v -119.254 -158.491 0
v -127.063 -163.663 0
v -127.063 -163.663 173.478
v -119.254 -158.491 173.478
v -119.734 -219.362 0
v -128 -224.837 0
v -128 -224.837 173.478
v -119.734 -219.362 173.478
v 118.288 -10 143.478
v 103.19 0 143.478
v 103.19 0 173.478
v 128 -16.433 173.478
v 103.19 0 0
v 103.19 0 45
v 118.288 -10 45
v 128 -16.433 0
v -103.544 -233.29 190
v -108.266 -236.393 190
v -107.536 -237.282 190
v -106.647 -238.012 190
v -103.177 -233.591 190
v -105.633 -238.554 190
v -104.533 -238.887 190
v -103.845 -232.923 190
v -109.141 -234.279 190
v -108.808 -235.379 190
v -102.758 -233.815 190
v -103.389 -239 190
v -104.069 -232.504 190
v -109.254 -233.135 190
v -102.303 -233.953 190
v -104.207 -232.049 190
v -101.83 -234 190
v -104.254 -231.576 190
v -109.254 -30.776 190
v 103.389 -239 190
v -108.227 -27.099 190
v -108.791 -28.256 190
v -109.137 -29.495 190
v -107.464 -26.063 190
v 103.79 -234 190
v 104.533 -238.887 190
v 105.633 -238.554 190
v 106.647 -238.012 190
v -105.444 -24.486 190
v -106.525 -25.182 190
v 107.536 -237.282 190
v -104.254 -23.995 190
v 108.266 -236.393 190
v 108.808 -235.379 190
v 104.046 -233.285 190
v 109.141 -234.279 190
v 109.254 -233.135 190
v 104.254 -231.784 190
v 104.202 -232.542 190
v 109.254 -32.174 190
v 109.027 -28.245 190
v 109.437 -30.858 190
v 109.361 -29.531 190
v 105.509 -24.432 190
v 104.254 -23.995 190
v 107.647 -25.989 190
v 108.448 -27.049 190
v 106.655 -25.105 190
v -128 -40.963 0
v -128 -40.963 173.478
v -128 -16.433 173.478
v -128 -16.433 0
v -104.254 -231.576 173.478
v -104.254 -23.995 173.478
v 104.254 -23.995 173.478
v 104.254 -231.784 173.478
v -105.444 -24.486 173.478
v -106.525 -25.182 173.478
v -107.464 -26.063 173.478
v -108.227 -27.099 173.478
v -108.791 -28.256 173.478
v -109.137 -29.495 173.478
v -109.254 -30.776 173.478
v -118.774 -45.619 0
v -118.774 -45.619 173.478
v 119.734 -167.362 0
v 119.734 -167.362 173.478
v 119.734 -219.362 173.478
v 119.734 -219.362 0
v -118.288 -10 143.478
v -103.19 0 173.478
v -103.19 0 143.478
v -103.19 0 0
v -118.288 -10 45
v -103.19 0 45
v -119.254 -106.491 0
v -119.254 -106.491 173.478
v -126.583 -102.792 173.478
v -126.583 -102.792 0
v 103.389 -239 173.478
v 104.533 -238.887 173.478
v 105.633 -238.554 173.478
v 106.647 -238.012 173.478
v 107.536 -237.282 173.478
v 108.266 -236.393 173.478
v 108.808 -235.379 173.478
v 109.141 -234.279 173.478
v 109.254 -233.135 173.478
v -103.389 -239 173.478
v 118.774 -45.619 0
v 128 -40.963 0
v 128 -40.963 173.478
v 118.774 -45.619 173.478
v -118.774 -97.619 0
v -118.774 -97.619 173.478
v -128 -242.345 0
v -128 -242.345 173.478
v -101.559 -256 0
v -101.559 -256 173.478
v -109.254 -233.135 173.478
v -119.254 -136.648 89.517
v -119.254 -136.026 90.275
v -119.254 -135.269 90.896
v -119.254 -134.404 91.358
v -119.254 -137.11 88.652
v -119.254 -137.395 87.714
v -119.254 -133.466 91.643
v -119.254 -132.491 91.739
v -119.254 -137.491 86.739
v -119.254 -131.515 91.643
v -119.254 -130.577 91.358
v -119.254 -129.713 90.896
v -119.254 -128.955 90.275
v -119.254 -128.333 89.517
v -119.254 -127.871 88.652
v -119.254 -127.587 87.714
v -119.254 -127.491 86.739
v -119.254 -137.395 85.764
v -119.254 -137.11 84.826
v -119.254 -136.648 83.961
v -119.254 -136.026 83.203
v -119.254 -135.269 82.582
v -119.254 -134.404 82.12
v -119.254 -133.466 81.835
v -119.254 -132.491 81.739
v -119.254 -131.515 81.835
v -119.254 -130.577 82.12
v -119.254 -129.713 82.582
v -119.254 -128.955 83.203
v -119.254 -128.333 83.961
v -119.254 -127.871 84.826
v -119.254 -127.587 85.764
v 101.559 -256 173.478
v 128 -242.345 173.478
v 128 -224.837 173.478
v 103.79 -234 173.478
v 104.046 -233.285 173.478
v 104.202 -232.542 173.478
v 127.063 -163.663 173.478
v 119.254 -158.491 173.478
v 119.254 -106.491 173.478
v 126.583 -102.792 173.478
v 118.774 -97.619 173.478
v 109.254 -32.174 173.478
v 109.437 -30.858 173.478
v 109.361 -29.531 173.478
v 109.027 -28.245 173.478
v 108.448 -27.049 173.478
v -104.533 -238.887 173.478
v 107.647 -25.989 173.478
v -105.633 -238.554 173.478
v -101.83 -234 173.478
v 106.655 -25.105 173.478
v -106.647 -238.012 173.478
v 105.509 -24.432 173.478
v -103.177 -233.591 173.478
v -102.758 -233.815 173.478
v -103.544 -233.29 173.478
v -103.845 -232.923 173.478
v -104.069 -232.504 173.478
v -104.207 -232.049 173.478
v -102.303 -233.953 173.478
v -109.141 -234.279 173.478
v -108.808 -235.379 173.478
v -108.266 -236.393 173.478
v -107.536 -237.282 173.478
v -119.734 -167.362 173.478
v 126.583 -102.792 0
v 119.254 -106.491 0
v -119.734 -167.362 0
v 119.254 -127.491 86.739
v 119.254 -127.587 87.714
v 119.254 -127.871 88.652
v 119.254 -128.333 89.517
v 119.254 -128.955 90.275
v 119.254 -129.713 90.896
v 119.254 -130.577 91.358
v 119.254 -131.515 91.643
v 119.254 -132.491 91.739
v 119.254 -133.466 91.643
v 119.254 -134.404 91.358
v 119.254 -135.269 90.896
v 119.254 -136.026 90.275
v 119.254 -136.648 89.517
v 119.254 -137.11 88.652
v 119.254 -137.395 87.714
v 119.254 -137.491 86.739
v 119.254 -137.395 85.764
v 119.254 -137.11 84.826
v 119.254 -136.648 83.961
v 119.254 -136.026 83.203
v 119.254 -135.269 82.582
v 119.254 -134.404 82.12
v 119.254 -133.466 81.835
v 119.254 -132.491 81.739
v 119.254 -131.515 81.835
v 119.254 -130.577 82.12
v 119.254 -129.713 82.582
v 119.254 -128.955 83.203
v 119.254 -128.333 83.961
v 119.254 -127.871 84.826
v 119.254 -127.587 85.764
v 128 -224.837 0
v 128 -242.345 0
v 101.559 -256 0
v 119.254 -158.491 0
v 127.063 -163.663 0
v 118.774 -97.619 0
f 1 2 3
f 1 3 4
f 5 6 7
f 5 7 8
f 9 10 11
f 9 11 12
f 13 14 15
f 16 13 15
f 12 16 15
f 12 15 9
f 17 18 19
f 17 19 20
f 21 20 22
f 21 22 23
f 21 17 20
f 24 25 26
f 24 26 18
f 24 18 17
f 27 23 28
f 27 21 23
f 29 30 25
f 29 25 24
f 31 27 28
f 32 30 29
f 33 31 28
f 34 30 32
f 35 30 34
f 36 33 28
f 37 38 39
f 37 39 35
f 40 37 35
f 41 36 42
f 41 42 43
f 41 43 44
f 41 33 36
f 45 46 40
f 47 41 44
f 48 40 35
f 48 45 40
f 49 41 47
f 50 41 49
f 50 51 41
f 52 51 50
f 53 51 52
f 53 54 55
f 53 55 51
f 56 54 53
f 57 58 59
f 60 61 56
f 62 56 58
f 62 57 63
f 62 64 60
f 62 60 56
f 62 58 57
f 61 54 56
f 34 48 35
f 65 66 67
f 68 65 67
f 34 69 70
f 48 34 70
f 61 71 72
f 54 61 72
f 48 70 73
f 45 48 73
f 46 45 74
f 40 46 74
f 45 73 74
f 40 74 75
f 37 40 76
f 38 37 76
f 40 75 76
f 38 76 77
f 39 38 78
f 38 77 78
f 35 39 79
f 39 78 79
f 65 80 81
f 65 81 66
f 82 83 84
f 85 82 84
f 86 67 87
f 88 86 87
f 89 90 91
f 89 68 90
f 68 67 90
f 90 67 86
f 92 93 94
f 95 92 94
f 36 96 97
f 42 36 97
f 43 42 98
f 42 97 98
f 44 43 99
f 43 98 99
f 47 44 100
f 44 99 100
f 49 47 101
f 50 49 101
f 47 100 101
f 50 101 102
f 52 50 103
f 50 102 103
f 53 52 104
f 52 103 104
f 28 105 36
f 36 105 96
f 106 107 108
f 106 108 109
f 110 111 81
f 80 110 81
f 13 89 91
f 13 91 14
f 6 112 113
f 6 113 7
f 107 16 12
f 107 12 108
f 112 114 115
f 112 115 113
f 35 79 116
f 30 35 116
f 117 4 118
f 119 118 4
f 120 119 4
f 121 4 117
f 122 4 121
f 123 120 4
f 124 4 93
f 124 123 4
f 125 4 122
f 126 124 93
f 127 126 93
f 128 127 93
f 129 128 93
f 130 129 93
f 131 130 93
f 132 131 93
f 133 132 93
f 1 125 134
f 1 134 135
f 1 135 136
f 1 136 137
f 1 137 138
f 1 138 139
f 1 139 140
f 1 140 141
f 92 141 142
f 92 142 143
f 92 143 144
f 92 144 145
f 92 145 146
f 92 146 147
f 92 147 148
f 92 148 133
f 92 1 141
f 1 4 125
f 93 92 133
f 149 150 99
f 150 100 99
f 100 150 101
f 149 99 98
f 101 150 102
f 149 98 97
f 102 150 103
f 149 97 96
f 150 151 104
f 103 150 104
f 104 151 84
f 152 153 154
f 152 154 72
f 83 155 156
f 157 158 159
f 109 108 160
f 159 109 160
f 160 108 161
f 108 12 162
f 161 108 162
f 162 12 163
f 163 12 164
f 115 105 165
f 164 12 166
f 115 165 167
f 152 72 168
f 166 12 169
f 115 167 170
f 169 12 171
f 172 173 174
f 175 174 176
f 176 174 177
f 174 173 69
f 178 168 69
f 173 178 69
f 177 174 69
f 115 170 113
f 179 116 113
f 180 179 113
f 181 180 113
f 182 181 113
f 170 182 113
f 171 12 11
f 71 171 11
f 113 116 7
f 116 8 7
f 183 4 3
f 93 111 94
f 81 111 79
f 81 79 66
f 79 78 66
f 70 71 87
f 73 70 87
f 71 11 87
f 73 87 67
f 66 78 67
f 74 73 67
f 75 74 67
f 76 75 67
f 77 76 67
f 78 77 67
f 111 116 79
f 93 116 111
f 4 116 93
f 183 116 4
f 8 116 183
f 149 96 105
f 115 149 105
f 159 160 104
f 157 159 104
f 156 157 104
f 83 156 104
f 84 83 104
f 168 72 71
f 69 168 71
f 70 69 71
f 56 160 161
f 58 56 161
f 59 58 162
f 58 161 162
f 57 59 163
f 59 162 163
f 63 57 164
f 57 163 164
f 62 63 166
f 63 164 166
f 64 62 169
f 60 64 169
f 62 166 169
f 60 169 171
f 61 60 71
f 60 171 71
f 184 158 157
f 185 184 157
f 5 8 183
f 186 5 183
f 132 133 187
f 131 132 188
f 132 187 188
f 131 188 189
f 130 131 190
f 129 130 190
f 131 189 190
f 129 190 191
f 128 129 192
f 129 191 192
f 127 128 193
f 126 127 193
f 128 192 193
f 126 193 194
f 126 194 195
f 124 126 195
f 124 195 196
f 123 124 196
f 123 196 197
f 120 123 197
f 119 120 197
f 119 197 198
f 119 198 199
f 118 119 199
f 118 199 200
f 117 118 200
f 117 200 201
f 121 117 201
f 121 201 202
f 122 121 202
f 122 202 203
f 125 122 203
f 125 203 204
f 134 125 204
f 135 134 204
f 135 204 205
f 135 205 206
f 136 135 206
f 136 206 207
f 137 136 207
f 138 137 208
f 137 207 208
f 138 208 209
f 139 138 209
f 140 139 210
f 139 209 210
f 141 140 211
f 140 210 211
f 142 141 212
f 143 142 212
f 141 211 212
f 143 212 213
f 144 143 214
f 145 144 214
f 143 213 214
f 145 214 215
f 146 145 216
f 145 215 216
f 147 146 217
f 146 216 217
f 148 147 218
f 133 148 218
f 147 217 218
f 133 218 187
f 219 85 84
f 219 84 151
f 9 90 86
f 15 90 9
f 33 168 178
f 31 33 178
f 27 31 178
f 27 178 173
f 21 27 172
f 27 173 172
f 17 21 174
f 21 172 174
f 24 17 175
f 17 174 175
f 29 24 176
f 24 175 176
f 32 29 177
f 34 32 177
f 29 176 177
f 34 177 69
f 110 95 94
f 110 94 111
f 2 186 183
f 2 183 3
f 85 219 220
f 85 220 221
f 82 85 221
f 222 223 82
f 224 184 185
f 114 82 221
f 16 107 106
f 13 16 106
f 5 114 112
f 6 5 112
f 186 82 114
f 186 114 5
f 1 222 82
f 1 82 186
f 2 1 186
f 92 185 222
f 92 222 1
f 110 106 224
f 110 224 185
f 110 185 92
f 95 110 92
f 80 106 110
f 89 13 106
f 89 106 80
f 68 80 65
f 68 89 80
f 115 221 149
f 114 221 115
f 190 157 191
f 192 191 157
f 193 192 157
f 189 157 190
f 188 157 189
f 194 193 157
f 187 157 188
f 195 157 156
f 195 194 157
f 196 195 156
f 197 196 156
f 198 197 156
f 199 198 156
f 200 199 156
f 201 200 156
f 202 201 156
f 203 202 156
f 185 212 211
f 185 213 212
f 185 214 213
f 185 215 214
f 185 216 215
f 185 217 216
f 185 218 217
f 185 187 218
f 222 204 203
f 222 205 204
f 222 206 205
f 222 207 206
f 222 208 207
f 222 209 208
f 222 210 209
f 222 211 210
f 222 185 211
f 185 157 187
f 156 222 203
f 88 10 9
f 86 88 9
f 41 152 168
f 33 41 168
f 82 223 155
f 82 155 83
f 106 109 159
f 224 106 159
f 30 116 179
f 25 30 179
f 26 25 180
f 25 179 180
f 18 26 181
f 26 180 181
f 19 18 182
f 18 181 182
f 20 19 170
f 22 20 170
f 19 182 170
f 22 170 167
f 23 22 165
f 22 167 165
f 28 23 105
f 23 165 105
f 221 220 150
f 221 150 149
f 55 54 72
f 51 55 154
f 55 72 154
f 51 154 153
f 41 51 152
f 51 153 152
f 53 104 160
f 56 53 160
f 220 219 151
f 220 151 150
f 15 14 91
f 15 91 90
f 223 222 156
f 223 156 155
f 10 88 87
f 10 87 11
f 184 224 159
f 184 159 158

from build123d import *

# Parameters (mm, degrees)
BOSS_EXTRUDE1_DEPTH = 173.478
BOSS_EXTRUDE2_DEPTH = 16.522
SKETCH5_W           = 256
SKETCH5_H           = 98.478
CUT_EXTRUDE3_DEPTH  = 10
SKETCH7_R           = 5
CUT_EXTRUDE4_DEPTH  = 404.448315513


with BuildPart() as part:
    # Sketch1 → Boss-Extrude1 (new body)
    with BuildSketch(Plane.XY):
        Polygon((-103.1895488, 0), (103.1895488, 0), (128, -16.432610434), (128, -40.962966098), (118.774155672, -45.61934731), (118.774155672, -97.61934731), (126.583328469, -102.791566604), (119.25400561, -106.490753372), (119.25400561, -158.490753372), (127.063178407, -163.662972666), (119.733855548, -167.362159434), (119.733855548, -219.362159434), (128, -224.837043001), (128, -242.345271931), (101.558790198, -256), (-101.558790198, -256), (-128, -242.345271931), (-128, -224.837043001), (-119.733855548, -219.362159434), (-119.733855548, -167.362159434), (-127.063178407, -163.662972666), (-119.25400561, -158.490753372), (-119.25400561, -106.490753372), (-126.583328469, -102.791566604), (-118.774155672, -97.61934731), (-118.774155672, -45.61934731), (-128, -40.962966098), (-128, -16.432610434), align=None)
    extrude(amount=BOSS_EXTRUDE1_DEPTH)

    # Sketch3 → Boss-Extrude2 (add)
    with BuildSketch(Plane.XY.offset(173.478)):
        with BuildLine():
            Line((-109.25400561, -30.77642723), (-109.25400561, -233.134965715))
            ThreePointArc((-109.25400561, -233.134965715), (-107.53617684, -237.28217123), (-103.388971325, -239))
            Line((-103.388971325, -239), (103.388971325, -239))
            ThreePointArc((103.388971325, -239), (107.53617684, -237.28217123), (109.25400561, -233.134965715))
            Line((109.25400561, -233.134965715), (109.25400561, -32.174007784))
            ThreePointArc((109.25400561, -32.174007784), (108.447882002, -27.049094521), (104.25400561, -23.99524907))
            Line((104.25400561, -23.99524907), (104.25400561, -231.784495248))
            ThreePointArc((104.25400561, -231.784495248), (104.136715259, -232.916299233), (103.789829206, -234))
            Line((103.789829206, -234), (-101.829987525, -234))
            ThreePointArc((-101.829987525, -234), (-103.544027151, -233.290021541), (-104.25400561, -231.575981915))
            Line((-104.25400561, -231.575981915), (-104.25400561, -23.99524907))
            ThreePointArc((-104.25400561, -23.99524907), (-107.868861491, -26.563815889), (-109.25400561, -30.77642723))
        make_face()
    extrude(amount=BOSS_EXTRUDE2_DEPTH)

    # Sketch5 → Cut-Extrude3 (cut)
    with BuildSketch(Plane(origin=(0, 0, 0), x_dir=(1, 0, 0), z_dir=(0, 1, 0))):
        with Locations((0, -94.239)):
            Rectangle(SKETCH5_W, SKETCH5_H)
    extrude(amount=-CUT_EXTRUDE3_DEPTH, mode=Mode.SUBTRACT)

    # Sketch7 → Cut-Extrude4 (cut, through all)
    with BuildSketch(Plane(origin=(119.25400561, 0, 0), x_dir=(0, 0, -1), z_dir=(1, 0, 0))):
        with Locations(Location((-86.739, -132.490753372, 0), (0, 0, 90))):
            Circle(SKETCH7_R)
    extrude(amount=-CUT_EXTRUDE4_DEPTH, mode=Mode.SUBTRACT)


solid = part.part
